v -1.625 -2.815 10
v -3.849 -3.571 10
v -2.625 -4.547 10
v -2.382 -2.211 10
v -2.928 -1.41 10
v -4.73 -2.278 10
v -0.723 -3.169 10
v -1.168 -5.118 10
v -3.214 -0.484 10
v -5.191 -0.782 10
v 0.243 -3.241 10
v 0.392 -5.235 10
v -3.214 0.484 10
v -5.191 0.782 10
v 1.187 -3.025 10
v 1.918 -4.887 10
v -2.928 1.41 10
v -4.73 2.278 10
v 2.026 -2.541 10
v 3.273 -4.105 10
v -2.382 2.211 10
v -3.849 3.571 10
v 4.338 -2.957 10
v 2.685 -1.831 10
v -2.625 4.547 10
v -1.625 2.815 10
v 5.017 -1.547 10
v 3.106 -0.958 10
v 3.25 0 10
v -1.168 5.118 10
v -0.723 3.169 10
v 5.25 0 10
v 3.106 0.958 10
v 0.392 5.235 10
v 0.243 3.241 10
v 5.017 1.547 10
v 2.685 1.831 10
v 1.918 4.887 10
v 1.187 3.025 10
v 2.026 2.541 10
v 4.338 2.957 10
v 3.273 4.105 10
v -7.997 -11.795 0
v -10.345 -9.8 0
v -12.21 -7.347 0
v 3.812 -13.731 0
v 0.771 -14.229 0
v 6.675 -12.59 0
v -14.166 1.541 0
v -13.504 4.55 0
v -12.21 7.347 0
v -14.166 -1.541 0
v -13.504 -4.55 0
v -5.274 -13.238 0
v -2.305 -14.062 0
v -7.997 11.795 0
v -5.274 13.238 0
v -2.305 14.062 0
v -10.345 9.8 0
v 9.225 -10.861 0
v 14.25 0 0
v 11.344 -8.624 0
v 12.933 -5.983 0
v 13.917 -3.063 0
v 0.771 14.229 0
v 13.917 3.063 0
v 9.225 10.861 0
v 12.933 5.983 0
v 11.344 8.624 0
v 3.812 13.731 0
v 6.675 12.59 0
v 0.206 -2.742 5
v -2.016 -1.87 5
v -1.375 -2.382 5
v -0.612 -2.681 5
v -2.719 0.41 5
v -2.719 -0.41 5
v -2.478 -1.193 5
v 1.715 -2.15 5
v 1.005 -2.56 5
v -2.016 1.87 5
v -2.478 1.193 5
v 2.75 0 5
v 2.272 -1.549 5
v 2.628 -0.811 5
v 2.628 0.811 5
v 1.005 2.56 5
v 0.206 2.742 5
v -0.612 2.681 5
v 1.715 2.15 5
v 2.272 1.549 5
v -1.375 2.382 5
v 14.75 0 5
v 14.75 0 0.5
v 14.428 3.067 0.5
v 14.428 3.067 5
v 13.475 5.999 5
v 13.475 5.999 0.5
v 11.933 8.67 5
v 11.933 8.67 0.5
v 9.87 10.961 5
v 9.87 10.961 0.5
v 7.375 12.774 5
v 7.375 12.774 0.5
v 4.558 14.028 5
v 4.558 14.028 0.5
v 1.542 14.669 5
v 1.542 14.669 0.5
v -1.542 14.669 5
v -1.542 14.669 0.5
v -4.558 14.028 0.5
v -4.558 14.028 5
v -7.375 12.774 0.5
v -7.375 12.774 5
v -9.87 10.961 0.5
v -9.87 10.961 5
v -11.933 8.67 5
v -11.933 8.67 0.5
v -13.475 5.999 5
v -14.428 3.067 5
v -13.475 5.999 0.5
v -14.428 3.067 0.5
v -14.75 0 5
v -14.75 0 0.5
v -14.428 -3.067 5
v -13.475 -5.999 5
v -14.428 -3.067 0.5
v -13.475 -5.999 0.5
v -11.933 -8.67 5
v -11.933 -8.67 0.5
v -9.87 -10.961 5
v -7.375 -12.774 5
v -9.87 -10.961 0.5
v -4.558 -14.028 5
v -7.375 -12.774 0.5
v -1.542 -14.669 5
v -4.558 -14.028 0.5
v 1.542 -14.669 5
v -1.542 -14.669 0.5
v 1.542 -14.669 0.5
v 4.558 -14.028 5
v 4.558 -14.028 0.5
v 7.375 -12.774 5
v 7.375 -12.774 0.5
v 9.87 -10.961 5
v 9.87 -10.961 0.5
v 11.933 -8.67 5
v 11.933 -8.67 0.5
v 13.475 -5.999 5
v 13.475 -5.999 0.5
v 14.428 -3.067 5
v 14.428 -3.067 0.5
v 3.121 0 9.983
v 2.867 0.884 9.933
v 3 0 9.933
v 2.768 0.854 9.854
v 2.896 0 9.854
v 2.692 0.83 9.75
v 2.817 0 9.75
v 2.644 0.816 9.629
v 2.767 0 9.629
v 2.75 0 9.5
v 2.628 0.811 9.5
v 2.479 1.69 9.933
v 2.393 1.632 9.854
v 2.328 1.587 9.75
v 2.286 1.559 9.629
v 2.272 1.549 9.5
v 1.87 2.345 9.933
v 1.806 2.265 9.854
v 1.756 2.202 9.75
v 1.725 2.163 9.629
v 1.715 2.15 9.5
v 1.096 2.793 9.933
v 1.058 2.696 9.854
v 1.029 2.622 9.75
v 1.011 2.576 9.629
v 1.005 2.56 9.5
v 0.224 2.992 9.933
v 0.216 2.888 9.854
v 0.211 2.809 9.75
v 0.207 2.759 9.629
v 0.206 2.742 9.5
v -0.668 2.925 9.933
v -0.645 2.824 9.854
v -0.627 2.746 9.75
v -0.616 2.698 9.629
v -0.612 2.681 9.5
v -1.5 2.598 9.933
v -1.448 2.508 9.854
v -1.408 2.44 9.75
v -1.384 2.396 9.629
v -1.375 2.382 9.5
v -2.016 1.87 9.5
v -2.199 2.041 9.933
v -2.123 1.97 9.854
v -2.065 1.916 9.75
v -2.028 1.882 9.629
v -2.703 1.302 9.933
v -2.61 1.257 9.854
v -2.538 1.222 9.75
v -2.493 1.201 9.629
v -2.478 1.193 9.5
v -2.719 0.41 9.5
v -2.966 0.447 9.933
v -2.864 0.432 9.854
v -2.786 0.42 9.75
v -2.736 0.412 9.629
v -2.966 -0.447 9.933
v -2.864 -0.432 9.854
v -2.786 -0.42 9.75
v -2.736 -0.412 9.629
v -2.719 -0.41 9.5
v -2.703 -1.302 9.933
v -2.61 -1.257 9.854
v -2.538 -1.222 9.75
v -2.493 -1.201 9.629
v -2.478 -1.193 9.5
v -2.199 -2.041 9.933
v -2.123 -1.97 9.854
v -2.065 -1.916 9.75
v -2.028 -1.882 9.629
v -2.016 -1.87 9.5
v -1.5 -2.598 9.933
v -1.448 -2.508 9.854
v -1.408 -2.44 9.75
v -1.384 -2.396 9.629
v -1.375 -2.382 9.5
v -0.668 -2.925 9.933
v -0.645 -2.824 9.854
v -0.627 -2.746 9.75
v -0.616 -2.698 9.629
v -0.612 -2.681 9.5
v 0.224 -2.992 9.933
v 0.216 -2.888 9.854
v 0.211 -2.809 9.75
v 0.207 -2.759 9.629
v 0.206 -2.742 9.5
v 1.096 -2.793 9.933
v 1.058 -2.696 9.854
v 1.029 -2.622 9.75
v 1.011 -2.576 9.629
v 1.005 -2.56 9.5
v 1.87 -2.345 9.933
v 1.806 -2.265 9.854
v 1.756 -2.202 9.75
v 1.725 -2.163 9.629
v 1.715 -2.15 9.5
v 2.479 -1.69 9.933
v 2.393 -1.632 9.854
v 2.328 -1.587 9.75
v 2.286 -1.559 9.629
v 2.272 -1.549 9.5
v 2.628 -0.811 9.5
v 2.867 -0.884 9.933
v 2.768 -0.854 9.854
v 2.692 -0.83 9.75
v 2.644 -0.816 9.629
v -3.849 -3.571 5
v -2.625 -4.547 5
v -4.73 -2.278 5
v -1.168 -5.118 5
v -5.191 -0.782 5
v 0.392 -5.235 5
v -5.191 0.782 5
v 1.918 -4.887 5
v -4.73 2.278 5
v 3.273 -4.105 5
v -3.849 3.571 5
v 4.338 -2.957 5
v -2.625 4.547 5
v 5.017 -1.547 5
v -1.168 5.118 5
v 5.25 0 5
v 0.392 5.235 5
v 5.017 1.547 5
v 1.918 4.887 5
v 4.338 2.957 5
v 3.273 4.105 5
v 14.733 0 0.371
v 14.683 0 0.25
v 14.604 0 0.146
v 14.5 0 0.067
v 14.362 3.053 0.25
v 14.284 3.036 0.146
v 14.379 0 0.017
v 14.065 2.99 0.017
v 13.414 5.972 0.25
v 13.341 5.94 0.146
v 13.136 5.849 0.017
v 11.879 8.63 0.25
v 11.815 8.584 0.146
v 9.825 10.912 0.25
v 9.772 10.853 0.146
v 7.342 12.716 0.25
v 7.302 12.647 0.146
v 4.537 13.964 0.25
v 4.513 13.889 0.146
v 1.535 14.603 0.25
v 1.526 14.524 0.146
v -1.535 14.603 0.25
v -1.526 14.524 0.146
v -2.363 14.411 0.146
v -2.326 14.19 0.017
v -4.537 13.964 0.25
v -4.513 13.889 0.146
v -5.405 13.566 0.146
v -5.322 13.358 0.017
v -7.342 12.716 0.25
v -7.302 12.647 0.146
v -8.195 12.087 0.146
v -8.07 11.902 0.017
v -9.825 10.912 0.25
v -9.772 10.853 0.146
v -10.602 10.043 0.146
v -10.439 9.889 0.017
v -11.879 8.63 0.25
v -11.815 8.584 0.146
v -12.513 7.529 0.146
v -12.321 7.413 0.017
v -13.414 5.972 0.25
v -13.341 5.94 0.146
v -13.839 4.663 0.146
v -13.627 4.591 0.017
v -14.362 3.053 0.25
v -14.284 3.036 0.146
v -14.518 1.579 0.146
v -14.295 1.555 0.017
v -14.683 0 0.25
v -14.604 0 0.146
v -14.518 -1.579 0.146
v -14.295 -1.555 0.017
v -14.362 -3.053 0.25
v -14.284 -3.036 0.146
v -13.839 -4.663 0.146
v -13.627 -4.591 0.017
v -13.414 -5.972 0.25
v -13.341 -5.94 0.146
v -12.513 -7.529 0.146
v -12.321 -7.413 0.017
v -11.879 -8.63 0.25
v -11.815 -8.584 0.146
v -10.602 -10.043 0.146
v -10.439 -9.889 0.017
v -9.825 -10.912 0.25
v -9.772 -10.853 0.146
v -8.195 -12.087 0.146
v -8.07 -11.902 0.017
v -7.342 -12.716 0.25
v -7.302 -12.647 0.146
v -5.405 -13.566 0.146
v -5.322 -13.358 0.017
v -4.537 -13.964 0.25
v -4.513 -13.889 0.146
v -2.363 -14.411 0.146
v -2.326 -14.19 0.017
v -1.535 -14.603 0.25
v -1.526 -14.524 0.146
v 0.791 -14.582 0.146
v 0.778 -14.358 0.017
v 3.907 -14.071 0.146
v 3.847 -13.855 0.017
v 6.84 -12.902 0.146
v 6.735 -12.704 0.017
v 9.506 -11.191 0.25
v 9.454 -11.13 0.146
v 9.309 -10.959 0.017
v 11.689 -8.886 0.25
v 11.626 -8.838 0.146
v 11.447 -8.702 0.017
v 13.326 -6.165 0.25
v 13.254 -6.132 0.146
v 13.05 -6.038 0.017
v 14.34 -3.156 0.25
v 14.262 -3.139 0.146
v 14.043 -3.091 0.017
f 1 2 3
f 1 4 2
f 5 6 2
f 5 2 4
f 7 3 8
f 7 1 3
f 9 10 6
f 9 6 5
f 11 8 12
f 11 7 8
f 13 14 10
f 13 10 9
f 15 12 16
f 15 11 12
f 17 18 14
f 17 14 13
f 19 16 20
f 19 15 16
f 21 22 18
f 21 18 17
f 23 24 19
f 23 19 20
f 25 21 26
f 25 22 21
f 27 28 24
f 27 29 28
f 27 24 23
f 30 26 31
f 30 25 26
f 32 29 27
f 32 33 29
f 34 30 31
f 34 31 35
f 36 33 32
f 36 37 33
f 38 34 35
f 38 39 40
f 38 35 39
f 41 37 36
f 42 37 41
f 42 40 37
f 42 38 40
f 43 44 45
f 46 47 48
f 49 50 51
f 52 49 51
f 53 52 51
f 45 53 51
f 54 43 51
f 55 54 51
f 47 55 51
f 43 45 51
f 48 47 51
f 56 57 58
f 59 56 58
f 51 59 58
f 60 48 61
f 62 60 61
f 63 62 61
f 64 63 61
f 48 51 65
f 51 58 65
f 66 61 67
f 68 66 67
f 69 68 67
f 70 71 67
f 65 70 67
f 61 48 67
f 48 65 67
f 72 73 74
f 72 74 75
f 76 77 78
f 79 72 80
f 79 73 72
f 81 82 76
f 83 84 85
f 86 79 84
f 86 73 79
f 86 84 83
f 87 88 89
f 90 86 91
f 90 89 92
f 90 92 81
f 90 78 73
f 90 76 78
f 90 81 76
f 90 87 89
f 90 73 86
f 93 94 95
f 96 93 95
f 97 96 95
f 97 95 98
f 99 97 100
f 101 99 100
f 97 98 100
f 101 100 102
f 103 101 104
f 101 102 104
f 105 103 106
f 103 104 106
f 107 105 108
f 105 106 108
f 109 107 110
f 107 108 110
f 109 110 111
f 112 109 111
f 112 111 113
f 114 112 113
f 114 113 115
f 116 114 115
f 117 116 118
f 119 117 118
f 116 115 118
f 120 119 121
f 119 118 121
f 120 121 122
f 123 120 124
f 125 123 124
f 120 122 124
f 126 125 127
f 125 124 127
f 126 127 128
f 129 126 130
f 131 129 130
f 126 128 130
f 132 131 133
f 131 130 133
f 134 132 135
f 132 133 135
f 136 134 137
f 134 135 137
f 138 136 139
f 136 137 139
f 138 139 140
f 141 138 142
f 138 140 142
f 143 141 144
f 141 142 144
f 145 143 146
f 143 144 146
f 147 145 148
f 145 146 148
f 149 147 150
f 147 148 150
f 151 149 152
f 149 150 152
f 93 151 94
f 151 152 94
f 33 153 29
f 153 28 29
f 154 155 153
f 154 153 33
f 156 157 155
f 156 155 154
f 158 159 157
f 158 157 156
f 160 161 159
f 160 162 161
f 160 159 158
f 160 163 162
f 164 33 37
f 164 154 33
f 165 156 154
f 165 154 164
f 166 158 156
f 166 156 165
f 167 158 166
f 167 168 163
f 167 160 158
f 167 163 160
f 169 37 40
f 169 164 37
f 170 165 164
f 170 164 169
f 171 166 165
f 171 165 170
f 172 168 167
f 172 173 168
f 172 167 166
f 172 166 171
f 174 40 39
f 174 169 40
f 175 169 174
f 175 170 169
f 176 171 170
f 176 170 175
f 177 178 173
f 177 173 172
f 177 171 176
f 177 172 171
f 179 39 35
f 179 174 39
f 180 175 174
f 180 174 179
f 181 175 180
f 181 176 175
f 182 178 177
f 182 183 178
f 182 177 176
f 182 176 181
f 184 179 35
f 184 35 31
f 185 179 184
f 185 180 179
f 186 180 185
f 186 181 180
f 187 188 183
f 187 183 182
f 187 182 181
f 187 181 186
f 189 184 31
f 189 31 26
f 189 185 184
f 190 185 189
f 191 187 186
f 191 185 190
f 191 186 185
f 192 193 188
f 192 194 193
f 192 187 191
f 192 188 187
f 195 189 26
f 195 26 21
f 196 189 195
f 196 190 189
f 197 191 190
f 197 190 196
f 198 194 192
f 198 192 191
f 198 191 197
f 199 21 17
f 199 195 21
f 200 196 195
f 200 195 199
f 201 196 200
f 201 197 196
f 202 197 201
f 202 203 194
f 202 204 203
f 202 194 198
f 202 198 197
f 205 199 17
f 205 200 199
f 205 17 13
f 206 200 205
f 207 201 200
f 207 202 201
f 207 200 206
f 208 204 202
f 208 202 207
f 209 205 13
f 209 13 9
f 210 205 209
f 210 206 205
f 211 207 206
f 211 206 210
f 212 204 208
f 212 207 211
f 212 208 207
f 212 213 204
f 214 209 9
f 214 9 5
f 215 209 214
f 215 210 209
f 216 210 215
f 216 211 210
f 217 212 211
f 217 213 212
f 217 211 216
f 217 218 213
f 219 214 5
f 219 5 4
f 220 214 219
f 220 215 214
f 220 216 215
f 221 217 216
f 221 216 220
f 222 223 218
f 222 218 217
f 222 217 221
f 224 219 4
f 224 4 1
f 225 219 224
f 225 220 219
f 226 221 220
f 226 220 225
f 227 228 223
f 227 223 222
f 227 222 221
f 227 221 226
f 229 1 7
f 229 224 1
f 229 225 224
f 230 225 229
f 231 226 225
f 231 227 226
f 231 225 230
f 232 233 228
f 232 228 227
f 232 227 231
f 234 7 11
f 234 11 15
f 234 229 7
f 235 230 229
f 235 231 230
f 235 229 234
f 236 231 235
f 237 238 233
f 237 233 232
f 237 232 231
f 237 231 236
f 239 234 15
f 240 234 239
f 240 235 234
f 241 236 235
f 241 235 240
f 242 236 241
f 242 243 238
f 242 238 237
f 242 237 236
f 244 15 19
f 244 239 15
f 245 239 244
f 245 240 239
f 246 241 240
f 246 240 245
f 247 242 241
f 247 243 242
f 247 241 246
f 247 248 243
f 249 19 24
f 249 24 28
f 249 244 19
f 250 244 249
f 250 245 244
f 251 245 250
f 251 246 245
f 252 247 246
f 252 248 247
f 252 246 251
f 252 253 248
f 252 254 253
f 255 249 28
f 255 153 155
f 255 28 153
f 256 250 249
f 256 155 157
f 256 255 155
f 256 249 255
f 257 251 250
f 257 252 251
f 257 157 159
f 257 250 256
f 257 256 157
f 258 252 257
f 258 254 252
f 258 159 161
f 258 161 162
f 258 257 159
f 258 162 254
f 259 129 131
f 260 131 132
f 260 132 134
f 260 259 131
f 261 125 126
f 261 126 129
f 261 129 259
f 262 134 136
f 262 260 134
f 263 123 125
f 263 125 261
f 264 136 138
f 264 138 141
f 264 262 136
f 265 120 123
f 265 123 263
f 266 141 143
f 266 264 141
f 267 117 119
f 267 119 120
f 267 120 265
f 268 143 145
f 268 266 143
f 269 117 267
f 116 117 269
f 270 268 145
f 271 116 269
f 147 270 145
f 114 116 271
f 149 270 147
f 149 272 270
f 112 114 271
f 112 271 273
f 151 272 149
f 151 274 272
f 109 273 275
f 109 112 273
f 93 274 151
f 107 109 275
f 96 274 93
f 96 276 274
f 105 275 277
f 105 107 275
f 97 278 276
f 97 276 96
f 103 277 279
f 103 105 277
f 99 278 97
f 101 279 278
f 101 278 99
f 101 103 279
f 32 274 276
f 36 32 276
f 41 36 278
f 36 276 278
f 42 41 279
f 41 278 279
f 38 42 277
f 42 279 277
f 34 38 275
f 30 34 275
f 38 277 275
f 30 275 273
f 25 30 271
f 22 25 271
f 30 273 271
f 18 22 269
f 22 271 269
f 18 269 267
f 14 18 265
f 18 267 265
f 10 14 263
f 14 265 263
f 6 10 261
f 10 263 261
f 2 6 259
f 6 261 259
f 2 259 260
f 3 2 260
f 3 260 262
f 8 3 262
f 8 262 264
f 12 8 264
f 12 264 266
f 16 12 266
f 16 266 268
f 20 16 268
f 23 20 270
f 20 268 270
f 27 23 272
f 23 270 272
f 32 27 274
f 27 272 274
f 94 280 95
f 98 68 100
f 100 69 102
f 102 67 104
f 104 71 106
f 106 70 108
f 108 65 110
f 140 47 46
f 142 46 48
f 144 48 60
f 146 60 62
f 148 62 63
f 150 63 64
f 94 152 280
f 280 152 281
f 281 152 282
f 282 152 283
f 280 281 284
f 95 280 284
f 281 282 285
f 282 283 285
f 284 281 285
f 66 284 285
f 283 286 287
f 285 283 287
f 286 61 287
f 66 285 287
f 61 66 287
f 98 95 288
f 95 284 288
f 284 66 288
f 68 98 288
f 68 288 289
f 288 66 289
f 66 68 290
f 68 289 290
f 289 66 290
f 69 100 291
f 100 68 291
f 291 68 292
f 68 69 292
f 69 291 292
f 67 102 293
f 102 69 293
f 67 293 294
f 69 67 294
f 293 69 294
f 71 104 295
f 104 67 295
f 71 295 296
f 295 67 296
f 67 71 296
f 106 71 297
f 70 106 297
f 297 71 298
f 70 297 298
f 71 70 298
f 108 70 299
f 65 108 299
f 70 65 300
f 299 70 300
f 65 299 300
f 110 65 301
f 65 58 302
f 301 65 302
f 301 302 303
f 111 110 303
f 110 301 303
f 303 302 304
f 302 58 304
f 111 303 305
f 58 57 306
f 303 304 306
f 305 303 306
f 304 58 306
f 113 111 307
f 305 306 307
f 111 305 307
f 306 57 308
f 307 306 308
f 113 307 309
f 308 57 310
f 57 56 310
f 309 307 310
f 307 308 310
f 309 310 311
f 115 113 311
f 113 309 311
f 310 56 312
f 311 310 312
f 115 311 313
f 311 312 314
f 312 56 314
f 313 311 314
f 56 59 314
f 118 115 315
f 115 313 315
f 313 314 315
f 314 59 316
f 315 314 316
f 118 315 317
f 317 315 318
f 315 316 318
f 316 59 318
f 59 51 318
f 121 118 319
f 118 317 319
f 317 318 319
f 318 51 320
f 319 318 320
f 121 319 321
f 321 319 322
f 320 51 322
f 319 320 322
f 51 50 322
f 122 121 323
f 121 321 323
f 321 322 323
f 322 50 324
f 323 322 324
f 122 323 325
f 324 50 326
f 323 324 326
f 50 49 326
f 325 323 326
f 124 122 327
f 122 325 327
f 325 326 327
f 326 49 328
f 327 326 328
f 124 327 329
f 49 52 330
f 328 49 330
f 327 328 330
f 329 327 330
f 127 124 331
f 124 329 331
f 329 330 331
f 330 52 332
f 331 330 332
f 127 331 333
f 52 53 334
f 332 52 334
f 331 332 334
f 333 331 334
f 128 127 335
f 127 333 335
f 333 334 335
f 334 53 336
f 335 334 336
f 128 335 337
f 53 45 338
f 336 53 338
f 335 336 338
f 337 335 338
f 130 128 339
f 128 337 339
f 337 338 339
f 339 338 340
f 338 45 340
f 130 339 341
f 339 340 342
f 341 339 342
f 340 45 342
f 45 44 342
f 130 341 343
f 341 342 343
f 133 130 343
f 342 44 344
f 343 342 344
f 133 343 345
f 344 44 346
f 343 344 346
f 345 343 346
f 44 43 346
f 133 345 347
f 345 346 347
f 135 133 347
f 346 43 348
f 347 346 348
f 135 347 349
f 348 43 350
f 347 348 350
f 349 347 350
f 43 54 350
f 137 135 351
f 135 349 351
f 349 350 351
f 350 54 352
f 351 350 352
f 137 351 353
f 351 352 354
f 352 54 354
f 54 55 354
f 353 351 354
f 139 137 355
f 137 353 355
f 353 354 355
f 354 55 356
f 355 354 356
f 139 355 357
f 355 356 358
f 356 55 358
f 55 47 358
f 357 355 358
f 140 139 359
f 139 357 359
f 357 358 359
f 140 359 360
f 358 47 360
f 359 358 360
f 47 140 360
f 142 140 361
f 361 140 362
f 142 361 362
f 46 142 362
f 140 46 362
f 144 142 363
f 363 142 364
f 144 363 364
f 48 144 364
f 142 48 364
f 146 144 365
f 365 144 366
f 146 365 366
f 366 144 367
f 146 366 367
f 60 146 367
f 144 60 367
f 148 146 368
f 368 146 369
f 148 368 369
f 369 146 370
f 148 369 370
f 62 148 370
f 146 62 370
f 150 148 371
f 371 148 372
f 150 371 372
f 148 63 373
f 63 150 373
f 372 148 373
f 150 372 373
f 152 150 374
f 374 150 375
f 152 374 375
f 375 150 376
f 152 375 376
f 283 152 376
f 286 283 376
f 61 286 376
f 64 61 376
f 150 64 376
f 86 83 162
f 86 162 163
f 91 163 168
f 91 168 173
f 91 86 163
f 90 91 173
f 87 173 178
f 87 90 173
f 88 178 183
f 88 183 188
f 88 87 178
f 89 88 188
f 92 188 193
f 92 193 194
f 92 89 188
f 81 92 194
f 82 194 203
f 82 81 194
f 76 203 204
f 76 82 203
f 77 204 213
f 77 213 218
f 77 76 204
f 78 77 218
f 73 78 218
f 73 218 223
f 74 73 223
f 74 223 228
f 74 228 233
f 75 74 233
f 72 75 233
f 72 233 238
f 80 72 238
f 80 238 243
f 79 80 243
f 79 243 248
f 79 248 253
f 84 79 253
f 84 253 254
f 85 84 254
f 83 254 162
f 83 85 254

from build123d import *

# Parameters (mm, degrees)
F0_R     = 14.75
F1_DEPTH = 5
F2_R     = 5.25
F2_R_2   = 2.75
F3_DEPTH = 5
F4_R     = 0.5


with BuildPart() as f1:
    # F0 (on Top) → F1 (new body)
    with BuildSketch(Plane.XY):
        Circle(F0_R)
    extrude(amount=F1_DEPTH)

    # F2 (on face) → F3 (join)
    with BuildSketch(Plane.XY.offset(5)):
        Circle(F2_R)
        Circle(F2_R_2, mode=Mode.SUBTRACT)
    extrude(amount=F3_DEPTH)

    # F4
    f4_edges = [f1.edges().sort_by_distance(p)[0] for p in [
        (-14.75, 0, 0),
        (-2.75, 0, 10),
    ]]
    fillet(f4_edges, radius=F4_R)


solid = f1.part
